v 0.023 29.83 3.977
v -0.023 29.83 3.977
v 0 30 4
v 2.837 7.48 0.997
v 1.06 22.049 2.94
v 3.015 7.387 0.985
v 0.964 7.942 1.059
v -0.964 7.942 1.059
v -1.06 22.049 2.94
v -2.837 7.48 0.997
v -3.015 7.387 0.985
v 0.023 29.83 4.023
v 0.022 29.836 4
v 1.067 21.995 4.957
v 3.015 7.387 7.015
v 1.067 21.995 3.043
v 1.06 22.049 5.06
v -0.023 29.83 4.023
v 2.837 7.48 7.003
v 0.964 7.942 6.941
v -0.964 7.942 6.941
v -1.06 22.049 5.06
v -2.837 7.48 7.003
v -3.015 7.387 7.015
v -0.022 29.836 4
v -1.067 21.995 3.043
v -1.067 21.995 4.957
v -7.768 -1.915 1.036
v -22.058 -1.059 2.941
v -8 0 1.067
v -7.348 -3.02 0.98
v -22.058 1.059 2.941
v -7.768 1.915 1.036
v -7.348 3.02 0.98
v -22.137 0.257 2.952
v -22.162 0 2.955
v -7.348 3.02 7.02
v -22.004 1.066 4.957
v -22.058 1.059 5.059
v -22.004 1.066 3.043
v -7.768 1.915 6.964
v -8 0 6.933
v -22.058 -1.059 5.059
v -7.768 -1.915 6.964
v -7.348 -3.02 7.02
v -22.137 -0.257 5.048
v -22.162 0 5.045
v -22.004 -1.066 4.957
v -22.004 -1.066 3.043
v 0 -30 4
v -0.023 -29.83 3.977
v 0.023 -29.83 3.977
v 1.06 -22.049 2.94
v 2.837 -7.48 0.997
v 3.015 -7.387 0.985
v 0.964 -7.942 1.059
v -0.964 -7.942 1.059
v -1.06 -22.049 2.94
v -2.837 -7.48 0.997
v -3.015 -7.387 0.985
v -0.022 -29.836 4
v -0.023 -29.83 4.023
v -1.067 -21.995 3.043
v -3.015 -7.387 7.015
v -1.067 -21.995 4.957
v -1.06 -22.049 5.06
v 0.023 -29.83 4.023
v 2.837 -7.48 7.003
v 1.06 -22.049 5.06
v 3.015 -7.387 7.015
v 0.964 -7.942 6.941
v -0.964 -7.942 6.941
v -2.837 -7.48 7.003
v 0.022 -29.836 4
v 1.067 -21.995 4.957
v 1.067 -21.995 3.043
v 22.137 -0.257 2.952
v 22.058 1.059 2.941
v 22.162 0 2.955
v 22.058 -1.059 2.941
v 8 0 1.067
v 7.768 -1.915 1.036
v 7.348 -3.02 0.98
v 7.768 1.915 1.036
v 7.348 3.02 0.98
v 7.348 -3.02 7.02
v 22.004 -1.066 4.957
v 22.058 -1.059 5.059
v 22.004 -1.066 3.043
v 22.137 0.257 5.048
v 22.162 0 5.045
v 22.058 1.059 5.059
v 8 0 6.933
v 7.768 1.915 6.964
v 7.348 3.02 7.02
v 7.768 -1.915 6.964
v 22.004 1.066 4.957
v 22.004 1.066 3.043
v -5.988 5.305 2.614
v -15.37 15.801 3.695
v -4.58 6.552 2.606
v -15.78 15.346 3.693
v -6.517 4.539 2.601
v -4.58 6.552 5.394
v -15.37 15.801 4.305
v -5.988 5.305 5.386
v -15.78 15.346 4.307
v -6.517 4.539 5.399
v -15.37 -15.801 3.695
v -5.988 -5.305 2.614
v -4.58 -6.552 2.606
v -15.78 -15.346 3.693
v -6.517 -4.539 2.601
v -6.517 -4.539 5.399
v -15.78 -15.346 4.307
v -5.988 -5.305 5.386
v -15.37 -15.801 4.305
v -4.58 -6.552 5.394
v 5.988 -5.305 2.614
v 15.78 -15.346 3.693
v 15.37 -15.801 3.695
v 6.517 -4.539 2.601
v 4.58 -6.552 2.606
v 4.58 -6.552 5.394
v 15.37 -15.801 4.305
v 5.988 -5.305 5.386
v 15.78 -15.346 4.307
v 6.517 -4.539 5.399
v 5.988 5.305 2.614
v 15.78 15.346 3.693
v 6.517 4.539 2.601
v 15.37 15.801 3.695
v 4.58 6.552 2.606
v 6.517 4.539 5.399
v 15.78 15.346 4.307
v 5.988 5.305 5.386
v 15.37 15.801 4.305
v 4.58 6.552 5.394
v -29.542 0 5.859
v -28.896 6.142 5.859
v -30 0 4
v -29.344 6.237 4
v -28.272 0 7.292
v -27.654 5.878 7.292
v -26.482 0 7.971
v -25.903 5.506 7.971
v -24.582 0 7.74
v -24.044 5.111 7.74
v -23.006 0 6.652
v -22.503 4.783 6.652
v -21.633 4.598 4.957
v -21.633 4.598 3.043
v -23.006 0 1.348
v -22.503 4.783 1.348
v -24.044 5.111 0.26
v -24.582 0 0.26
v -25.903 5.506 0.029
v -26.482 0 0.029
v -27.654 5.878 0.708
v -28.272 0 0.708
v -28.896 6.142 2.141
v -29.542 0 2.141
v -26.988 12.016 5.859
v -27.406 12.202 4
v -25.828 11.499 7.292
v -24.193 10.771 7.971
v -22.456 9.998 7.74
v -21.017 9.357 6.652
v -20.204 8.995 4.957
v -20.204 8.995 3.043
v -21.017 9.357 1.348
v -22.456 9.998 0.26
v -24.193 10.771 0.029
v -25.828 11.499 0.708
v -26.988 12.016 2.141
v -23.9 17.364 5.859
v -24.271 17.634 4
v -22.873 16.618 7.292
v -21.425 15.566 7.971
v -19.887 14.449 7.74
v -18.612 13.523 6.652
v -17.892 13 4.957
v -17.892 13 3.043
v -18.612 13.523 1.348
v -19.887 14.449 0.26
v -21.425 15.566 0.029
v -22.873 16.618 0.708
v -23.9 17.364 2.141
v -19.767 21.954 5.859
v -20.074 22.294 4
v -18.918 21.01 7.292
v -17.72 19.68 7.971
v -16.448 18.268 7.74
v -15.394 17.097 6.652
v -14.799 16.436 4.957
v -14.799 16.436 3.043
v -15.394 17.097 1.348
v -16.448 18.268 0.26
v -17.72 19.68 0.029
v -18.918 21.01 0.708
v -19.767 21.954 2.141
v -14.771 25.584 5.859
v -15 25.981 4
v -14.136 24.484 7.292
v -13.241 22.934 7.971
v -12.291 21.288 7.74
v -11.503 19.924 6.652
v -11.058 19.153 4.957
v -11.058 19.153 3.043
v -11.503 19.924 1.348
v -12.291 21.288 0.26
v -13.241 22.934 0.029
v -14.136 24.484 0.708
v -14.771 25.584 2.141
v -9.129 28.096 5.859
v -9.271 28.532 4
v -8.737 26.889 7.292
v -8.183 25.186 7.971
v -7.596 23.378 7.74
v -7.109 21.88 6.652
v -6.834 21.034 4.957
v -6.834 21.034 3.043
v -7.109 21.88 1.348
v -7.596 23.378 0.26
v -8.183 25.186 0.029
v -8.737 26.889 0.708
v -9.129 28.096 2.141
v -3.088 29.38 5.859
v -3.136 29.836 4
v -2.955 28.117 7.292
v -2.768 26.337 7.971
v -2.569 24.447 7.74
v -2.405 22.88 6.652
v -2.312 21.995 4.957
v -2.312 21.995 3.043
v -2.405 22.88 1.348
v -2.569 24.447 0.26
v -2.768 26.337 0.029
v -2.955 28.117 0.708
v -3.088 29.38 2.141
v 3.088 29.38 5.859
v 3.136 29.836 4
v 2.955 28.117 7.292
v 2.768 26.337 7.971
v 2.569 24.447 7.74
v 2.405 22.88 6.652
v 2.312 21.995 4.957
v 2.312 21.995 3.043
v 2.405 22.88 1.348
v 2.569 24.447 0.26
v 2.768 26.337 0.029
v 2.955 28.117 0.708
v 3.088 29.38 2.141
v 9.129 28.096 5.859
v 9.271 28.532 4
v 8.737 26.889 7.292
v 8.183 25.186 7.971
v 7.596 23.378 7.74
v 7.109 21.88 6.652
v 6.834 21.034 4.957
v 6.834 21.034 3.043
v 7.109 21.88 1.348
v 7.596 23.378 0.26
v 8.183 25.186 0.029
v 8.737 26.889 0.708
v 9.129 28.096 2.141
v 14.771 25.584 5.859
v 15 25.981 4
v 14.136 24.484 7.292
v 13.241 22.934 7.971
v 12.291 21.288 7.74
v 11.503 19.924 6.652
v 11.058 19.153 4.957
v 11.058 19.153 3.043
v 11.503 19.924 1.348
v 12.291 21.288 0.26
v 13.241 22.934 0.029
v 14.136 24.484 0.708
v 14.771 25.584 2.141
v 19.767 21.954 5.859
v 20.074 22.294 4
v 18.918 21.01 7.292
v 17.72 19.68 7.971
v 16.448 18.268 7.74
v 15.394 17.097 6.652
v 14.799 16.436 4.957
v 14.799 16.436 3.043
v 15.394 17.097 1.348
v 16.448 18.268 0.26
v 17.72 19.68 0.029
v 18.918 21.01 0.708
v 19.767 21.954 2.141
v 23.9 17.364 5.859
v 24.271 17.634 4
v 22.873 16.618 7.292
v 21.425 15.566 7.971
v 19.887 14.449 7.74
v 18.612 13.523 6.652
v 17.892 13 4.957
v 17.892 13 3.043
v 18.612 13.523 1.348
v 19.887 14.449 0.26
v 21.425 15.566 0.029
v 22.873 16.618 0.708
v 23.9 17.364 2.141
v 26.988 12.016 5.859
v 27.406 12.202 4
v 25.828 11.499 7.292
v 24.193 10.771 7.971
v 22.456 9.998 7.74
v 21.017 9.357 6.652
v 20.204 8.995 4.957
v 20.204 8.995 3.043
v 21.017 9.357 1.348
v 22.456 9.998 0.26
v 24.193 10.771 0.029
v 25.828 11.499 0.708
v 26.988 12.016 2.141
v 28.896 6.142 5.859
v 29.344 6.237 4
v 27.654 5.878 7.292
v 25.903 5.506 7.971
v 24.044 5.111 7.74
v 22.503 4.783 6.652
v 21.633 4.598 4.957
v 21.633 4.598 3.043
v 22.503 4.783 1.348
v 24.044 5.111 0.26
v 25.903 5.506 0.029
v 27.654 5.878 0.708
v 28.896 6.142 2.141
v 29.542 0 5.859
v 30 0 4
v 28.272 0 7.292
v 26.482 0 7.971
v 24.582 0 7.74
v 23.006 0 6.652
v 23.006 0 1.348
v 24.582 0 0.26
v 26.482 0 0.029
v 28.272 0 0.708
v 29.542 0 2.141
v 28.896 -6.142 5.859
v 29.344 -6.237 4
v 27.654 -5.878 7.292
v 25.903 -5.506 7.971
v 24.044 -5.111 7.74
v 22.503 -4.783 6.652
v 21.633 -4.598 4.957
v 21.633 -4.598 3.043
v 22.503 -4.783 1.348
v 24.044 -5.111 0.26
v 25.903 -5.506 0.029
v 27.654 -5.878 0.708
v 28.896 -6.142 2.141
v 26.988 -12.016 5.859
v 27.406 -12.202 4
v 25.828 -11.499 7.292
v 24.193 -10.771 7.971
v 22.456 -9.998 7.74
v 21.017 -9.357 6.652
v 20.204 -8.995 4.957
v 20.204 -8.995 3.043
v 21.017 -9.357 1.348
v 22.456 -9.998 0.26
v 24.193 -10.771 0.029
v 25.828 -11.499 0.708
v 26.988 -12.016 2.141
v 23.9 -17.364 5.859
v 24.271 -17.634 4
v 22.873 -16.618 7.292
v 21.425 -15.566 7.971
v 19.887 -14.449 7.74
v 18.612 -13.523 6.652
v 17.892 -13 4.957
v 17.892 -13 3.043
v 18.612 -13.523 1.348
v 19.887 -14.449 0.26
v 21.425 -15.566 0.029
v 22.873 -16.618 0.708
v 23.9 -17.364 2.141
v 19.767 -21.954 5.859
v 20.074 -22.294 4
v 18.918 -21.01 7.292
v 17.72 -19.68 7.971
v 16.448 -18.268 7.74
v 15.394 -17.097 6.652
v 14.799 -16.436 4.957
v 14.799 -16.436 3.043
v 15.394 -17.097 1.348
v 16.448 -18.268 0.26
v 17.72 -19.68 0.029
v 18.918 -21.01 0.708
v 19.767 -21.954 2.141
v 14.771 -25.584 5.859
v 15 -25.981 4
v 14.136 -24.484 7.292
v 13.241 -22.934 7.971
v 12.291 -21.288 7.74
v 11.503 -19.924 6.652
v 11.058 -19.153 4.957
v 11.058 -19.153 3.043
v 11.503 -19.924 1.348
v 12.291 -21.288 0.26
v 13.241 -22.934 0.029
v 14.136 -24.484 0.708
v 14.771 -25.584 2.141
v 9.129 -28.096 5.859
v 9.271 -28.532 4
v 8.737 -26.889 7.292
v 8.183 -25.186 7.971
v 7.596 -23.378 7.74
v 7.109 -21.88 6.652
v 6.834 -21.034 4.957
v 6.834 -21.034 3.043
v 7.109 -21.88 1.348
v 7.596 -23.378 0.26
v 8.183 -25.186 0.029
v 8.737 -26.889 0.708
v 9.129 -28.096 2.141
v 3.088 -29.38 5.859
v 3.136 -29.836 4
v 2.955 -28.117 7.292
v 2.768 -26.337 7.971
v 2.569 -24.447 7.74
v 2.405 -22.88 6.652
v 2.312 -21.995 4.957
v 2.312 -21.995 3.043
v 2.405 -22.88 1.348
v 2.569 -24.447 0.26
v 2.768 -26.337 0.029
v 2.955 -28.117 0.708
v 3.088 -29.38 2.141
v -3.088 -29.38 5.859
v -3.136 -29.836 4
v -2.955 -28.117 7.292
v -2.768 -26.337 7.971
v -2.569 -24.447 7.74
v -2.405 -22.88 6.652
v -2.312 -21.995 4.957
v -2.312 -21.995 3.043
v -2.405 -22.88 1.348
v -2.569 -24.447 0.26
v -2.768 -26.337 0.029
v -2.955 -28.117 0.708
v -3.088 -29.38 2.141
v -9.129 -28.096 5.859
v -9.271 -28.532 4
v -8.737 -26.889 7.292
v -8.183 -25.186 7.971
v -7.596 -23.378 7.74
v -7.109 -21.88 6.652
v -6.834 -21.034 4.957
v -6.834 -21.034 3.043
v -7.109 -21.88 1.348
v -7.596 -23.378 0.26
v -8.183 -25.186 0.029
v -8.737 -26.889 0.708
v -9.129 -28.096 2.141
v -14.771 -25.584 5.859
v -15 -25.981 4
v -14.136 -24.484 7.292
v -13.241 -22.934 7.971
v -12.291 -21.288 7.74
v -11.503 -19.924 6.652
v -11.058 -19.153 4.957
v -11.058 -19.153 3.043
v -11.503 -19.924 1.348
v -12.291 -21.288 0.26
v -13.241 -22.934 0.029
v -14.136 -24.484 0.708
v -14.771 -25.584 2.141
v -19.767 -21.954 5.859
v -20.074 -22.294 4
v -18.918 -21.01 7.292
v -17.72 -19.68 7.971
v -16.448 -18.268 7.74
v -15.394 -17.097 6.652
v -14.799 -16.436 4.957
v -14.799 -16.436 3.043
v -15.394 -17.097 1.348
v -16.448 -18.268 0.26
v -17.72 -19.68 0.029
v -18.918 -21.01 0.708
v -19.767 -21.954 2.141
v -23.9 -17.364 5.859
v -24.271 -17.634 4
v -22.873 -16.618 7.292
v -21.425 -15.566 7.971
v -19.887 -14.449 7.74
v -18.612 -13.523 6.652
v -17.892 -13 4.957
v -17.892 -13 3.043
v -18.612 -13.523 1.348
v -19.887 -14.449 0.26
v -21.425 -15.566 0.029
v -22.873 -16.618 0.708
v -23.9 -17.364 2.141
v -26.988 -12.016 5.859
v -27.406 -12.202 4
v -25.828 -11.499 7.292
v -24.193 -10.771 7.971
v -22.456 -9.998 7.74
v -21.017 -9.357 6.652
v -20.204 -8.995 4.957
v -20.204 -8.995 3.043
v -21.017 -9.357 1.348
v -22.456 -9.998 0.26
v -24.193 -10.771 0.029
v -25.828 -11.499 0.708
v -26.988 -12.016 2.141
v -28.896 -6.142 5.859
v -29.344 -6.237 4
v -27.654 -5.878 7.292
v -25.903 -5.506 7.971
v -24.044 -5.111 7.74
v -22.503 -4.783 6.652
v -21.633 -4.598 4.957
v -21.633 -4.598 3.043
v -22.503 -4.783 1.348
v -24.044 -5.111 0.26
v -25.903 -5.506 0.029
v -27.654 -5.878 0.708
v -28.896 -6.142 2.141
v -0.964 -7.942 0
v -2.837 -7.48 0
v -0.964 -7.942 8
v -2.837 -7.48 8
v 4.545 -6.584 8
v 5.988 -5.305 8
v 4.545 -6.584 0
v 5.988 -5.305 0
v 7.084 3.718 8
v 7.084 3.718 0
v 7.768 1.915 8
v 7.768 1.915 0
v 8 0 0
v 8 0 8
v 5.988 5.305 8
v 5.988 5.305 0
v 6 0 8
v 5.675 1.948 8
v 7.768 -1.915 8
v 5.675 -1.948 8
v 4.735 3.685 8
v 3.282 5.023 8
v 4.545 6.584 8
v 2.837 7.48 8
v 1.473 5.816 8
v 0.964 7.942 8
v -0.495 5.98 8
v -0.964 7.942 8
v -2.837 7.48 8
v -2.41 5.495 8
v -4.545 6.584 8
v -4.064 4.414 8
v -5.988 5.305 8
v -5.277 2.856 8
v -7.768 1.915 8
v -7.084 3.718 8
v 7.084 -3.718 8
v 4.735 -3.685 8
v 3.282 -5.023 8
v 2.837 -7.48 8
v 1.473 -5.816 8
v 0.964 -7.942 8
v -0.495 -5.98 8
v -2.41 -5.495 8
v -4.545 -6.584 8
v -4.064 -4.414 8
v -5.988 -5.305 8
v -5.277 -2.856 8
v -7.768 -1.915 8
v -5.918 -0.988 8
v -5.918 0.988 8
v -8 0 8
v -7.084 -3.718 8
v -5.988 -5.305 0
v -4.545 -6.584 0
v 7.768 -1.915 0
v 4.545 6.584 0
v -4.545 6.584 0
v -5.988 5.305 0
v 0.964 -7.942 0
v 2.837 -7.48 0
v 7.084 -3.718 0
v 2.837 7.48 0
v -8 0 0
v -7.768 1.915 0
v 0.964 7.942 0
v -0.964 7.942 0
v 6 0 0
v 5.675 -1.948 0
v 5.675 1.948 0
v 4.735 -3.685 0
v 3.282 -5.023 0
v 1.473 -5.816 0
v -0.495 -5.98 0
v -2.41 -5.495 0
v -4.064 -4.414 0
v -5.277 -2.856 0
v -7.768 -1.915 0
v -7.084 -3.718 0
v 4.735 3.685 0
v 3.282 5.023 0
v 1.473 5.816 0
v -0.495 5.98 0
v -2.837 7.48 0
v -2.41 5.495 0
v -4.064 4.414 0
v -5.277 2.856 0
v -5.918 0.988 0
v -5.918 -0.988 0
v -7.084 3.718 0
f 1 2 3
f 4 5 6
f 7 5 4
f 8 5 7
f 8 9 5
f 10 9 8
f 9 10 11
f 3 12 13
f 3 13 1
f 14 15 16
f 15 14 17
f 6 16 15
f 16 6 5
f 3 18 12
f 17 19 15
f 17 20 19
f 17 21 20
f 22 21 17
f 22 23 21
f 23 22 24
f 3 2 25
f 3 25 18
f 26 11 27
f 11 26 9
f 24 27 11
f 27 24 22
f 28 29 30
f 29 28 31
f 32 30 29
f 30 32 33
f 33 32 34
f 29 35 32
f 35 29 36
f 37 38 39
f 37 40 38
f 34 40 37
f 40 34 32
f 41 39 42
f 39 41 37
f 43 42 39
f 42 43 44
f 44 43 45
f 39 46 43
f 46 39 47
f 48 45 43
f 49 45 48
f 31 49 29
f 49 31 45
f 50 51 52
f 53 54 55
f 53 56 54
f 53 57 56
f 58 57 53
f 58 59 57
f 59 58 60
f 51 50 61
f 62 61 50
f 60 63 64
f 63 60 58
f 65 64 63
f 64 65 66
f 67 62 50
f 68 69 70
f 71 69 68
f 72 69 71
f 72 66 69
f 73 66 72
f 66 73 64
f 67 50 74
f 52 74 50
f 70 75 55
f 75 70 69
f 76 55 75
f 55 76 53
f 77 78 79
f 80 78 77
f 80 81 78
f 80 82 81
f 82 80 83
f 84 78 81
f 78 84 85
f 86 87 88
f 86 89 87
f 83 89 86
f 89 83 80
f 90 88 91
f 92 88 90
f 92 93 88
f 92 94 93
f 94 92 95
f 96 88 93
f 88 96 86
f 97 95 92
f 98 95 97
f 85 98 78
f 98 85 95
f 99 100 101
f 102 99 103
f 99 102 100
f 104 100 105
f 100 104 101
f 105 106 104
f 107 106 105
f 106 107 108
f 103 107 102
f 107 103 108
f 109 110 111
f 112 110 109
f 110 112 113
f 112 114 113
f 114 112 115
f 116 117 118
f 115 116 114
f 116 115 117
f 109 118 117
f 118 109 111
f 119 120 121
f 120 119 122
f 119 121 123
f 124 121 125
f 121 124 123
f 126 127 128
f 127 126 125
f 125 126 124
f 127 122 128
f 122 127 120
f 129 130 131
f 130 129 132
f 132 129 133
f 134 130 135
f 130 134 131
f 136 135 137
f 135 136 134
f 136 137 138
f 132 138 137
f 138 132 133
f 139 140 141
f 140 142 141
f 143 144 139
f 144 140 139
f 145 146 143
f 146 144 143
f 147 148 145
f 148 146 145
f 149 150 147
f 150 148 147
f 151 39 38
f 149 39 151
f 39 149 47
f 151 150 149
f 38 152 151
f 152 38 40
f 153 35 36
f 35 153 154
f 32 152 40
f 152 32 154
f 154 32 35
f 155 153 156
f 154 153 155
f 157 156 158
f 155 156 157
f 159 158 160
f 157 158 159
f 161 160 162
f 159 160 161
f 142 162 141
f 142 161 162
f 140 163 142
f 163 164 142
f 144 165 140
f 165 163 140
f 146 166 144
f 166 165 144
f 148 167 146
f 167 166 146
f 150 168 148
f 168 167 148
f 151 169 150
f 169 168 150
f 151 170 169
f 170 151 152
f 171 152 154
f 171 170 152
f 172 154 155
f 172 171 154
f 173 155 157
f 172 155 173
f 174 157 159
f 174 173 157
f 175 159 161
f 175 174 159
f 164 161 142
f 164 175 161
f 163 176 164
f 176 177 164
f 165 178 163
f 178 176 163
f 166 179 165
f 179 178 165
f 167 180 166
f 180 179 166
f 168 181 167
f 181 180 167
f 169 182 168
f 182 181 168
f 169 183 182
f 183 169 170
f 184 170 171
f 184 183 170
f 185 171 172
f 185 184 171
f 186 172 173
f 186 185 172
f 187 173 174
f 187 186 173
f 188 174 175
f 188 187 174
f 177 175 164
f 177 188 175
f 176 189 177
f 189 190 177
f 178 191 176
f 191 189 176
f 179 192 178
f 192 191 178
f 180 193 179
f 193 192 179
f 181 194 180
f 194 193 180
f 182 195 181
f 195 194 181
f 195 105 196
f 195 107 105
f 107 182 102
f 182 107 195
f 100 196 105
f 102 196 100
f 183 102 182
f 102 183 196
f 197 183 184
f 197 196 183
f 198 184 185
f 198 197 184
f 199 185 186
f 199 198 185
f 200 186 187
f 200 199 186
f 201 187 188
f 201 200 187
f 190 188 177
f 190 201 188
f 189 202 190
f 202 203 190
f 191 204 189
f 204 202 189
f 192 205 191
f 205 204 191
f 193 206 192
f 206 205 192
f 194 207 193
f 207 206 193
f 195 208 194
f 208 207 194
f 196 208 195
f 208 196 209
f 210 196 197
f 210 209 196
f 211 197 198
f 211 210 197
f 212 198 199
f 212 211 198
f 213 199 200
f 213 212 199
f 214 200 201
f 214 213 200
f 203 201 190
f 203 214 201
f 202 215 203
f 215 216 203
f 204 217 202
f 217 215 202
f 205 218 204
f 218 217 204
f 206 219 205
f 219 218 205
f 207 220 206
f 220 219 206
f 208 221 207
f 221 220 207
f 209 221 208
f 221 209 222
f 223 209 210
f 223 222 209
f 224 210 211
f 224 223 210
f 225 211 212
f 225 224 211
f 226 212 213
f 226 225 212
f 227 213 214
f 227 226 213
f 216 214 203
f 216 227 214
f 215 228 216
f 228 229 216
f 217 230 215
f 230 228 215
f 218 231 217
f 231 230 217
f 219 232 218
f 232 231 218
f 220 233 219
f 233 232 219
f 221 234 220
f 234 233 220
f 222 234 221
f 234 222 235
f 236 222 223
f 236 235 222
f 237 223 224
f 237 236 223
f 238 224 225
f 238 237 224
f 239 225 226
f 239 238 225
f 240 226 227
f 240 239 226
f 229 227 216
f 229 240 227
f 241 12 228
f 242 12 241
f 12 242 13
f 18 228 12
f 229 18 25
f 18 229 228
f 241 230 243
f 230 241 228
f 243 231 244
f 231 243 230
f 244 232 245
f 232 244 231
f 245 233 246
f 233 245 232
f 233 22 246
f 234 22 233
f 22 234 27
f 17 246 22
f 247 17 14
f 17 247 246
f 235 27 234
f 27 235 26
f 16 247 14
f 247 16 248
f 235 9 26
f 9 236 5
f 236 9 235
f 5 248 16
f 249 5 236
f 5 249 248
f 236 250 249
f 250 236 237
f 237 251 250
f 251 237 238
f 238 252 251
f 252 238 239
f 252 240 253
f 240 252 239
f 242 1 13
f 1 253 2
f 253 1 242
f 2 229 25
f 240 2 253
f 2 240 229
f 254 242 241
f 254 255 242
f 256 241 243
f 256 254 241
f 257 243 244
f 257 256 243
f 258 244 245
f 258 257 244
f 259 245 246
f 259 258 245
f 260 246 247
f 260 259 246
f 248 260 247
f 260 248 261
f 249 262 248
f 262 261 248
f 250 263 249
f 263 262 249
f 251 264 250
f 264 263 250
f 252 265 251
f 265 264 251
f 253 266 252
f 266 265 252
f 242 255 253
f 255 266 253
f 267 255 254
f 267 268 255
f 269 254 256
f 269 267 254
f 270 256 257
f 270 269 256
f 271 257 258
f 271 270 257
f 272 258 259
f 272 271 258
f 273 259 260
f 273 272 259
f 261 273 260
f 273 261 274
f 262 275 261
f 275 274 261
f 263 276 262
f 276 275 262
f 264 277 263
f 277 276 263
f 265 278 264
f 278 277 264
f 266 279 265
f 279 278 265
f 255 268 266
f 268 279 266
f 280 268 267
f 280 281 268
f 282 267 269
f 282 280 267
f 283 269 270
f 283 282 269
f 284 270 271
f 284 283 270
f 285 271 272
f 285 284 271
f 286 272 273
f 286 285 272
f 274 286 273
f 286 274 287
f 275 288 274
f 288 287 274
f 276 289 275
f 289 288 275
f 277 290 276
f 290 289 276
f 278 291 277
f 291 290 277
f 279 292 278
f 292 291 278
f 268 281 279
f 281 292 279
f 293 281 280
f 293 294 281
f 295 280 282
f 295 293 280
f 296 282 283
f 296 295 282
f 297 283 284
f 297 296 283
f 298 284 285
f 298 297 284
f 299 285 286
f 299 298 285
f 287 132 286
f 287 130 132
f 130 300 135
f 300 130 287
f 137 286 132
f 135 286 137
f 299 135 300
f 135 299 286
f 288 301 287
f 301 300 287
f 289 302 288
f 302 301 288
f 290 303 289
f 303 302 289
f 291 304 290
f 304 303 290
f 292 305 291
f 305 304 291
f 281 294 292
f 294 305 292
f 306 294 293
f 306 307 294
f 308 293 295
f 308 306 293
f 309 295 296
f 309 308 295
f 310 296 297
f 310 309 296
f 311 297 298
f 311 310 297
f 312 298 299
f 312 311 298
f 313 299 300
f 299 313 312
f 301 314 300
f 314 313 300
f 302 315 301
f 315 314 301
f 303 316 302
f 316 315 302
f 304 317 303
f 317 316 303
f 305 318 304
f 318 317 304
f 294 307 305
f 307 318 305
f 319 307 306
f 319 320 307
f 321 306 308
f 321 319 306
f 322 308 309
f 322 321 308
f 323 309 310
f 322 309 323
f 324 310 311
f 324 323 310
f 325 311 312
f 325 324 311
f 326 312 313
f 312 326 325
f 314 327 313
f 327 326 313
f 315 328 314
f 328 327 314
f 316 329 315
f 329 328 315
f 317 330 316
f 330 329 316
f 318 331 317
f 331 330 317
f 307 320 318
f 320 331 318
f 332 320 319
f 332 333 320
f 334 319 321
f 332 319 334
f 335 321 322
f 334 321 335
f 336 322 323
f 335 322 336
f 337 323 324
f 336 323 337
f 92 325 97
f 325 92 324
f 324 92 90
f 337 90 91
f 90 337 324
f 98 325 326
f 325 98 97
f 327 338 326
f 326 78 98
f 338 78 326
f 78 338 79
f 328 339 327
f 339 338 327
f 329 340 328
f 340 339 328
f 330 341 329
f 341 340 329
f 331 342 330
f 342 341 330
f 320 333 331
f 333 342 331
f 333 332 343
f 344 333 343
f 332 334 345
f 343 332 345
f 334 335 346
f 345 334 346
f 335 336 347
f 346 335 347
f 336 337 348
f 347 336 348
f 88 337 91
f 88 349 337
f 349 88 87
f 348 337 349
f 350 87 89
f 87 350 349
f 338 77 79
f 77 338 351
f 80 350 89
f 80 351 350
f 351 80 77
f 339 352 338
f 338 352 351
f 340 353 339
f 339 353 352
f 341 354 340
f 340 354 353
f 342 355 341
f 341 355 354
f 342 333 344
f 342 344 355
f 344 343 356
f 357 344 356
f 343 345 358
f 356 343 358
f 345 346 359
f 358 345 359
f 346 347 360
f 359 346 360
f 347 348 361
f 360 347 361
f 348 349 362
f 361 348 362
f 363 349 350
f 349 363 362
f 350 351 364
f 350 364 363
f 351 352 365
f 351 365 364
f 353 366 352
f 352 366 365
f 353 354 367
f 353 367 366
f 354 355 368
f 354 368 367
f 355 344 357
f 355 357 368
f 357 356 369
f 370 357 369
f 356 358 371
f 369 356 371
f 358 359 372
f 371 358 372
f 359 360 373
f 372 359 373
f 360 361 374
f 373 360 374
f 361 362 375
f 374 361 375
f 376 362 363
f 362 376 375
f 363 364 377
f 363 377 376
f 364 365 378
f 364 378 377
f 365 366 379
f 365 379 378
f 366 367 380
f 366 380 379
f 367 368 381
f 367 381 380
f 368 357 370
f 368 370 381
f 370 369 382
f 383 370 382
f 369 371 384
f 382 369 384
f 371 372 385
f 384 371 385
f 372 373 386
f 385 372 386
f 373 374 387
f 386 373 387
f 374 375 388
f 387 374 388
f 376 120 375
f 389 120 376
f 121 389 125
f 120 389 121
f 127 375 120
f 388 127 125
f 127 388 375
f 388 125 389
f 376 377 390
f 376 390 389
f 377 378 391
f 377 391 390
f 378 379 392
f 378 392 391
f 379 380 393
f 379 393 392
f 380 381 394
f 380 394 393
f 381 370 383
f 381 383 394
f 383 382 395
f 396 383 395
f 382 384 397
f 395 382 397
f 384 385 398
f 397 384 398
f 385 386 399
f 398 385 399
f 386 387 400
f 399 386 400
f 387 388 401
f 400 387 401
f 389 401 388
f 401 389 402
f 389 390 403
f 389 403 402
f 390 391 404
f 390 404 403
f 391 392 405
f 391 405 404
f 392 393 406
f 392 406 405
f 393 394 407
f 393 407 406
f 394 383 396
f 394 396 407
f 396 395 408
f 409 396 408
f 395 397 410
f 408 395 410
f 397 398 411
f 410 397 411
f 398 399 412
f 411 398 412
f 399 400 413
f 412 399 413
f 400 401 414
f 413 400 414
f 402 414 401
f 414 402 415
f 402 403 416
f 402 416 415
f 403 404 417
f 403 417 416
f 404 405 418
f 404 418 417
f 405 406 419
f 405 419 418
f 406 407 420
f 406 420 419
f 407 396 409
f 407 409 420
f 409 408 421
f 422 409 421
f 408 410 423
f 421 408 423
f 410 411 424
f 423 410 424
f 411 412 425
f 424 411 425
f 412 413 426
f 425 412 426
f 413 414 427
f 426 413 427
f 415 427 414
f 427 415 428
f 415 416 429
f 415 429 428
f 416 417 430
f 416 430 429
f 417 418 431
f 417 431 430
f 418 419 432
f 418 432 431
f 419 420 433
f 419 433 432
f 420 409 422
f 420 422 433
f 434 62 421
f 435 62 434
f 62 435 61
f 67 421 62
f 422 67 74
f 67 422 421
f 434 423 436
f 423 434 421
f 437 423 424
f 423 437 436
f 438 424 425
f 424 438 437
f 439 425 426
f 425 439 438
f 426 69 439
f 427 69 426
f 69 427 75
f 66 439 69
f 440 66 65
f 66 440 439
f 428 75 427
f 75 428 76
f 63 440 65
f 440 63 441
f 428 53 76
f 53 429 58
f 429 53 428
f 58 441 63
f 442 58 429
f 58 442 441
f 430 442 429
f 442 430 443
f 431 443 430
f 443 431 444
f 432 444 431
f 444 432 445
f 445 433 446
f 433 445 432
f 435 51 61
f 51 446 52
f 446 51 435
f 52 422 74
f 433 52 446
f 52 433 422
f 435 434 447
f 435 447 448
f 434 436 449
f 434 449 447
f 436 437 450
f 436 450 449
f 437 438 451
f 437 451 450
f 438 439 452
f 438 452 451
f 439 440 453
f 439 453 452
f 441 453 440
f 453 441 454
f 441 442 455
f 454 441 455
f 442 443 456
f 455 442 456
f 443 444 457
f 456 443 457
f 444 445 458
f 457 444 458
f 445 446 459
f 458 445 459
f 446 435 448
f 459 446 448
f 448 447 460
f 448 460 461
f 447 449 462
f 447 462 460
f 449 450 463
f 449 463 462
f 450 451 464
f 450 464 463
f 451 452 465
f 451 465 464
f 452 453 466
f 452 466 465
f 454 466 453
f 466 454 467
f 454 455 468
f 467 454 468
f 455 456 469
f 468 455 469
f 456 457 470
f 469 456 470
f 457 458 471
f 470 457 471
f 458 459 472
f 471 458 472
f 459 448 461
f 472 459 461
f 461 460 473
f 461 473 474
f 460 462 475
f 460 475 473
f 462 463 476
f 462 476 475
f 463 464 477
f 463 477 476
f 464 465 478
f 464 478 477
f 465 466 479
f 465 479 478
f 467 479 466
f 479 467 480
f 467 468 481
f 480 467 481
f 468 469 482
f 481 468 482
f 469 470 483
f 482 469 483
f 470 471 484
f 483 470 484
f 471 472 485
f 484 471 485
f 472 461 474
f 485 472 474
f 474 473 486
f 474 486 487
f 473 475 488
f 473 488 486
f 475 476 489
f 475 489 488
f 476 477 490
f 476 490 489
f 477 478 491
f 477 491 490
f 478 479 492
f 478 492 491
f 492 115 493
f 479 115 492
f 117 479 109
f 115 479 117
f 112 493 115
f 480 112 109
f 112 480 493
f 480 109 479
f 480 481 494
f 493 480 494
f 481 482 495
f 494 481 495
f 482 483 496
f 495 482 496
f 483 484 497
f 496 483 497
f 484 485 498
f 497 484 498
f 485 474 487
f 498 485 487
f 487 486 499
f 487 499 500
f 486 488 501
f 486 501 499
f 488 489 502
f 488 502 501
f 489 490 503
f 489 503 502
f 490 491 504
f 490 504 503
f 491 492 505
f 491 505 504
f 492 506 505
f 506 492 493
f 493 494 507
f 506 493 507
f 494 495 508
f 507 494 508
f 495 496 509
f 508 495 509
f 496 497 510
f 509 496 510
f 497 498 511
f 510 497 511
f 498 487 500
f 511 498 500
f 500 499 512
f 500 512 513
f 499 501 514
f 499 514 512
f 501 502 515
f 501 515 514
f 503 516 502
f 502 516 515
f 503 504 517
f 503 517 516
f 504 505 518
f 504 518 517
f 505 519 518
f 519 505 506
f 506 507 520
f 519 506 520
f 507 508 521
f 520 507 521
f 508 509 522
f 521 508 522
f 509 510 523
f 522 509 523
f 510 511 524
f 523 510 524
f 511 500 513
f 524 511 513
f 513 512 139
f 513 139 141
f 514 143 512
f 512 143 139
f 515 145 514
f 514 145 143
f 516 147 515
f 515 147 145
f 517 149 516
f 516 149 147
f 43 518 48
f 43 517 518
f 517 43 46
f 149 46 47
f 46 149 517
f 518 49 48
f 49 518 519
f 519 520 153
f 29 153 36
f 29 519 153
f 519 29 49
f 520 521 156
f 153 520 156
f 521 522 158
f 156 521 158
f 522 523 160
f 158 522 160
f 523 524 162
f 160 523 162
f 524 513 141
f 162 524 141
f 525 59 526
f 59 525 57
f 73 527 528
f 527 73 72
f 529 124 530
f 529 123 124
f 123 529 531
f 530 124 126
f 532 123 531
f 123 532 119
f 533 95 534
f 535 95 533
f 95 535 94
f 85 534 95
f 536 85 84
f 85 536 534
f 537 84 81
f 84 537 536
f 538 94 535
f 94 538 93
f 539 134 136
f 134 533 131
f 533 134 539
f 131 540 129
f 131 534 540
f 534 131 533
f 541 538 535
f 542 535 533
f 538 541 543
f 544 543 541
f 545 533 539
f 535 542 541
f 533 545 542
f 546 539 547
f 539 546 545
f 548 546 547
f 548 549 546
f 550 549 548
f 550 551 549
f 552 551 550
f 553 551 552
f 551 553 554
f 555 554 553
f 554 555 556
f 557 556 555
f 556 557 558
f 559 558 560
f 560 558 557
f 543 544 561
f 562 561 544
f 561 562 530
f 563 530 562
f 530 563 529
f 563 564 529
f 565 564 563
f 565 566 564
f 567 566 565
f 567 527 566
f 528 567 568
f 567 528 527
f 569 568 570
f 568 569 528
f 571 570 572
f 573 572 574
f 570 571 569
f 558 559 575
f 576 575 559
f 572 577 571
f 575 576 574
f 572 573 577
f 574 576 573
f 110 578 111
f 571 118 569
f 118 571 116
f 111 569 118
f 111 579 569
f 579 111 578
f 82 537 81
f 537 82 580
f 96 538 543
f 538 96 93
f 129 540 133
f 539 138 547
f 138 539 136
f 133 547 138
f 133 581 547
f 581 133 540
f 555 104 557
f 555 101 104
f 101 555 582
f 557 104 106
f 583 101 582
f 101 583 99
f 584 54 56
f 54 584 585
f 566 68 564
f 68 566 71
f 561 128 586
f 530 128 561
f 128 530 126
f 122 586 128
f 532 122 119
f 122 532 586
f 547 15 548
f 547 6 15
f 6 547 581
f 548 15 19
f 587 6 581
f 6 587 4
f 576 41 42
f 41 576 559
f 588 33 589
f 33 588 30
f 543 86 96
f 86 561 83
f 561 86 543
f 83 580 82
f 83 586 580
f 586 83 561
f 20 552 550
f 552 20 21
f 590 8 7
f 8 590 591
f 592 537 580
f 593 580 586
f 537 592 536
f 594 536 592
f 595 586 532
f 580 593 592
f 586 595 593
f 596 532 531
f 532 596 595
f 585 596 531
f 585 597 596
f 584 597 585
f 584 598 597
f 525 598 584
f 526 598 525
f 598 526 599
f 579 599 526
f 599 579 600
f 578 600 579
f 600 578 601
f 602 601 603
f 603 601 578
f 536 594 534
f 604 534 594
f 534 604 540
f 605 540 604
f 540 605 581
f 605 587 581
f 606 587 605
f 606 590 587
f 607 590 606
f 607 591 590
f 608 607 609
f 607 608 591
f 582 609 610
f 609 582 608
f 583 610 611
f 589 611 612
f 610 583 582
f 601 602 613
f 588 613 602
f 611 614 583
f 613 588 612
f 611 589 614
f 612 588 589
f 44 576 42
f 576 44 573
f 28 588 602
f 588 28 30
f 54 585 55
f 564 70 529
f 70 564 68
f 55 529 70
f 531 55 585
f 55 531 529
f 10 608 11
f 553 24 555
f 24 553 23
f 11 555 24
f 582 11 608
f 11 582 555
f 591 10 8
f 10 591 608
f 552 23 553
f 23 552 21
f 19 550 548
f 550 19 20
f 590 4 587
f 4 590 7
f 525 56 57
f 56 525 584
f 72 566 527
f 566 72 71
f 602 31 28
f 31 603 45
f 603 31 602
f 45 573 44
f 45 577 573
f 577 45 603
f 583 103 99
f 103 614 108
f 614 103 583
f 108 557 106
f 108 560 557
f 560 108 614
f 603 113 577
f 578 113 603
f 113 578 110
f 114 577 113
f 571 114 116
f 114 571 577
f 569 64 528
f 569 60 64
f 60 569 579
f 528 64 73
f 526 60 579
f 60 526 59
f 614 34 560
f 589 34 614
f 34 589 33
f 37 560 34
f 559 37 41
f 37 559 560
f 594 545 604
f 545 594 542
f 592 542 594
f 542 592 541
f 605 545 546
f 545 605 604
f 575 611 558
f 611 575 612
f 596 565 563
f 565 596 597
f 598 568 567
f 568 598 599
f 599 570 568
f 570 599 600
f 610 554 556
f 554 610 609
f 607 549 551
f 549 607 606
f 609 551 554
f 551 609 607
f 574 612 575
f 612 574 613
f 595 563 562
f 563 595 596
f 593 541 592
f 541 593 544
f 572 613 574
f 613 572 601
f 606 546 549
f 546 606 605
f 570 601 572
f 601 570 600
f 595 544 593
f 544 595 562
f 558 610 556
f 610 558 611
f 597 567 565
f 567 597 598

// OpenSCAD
debug=false;

spinner_height=8;
spinner_half_height=spinner_height/2;
spinner_quarter_height=spinner_height/4;
spinner_diameter=60;
spinner_radius=spinner_diameter/2;

housing_radius=8;
bearing_outer_radius=6;
bearing_inner_radius=4;
// housing_radius=10;
// bearing_outer_radius=8;
// bearing_inner_radius=6;

// function f(x) = (housing_radius + bearing_outer_radius) / 2;
// function g() = (housing_radius + bearing_outer_radius) / 2;
// hey=f(0);
// echo("hey", hey);
// hey2=g();
// echo("hey2", hey2);

// function spokeStart() = (housing_radius + bearing_outer_radius) / 2;
// function spokeStart() = bearing_outer_radius*(1+1/3);
function spokeStart() = 0;

if (debug) {
  echo("spokeStart()", spokeStart());
}

module bearing() {
  color("blue") {
    difference() {
      cylinder(h=spinner_height, r1=bearing_outer_radius, r2=bearing_outer_radius);
      translate([0,0,-1]) cylinder(h=spinner_height+2, r1=bearing_inner_radius, r2=bearing_inner_radius);
    }
    difference() {
      cylinder(h=spinner_height, r1=bearing_outer_radius-3, r2=bearing_outer_radius-3);
      translate([0,0,-1]) cylinder(h=spinner_height+2, r1=bearing_inner_radius-3, r2=bearing_inner_radius-3);
    }
  }
}

module bearingNegative() {
  color("green") {
    translate([0,0,-spinner_height]) cylinder(h=3*spinner_height, r1=bearing_outer_radius, r2=bearing_outer_radius);
  }
}

module rim() {
    rotate_extrude() {
        translate([spinner_radius-spinner_half_height,spinner_half_height,0]) circle(r=spinner_half_height);
    }
}

module housing() {
    cylinder(h=spinner_height, r1=housing_radius, r2=housing_radius);
}

FatSpokePoints = [
  [spinner_half_height, spokeStart(), 0], // 0 bottom-right
  [-spinner_half_height, spokeStart(), 0], // 1 bottom-left
  [0, spinner_radius, spinner_half_height], // 2 apex
  [spinner_half_height, spokeStart(), spinner_height], // 3 top-right
  [-spinner_half_height, spokeStart(), spinner_height] // 4 top-left
];
FatSpokeFaces = [
  [0,2,1],  // bottom
  [3,2,0],  // right
  [1,2,4],  // left
  [4,2,3],  // top
  [3,0,1,4] // back
];
// translate([-7.5,0,0]) {
//   polyhedron(FatSpokePoints, FatSpokeFaces);
//   color("yellow") {
//     for (idx = [ 0 : len(FatSpokePoints) - 1 ] ) {
//       echo("FatSpokePoints", idx, FatSpokePoints[idx]);
//       translate(FatSpokePoints[idx]) rotate([90,0,0]) linear_extrude(height=0.2) text(text=str(idx), size=2);
//     }
//   }
// }
module fatSpokes() {
  spokes=4;
  starting=0;
  for (angle = [starting : 360 / spokes : 360]) {
    rotate([0,0,angle]) translate([0,0,0]) polyhedron(points=FatSpokePoints, faces=FatSpokeFaces);
  }
}

ThinSpokePoints = [
  [spinner_quarter_height, spokeStart(), spinner_quarter_height], // 0 bottom-right
  [-spinner_quarter_height, spokeStart(), spinner_quarter_height], // 1 bottom-left
  [0, spinner_radius-spinner_half_height, spinner_half_height], // 2 apex
  [spinner_quarter_height, spokeStart(), spinner_height-spinner_quarter_height], // 3 top-right
  [-spinner_quarter_height, spokeStart(), spinner_height-spinner_quarter_height] // 4 top-left
];
ThinSpokeFaces = [
  [0,2,1],  // bottom
  [3,2,0],  // right
  [1,2,4],  // left
  [4,2,3],  // top
  [3,0,1,4] // back
];
// translate([7.5,0,0]) {
//   polyhedron(ThinSpokePoints, ThinSpokeFaces);
//   color("yellow") {
//     for (idx = [ 0 : len(ThinSpokePoints) - 1 ] ) {
//       echo("ThinSpokePoints", idx, ThinSpokePoints[idx]);
//       translate(ThinSpokePoints[idx]) rotate([90,0,0]) linear_extrude(height=0.2) text(text=str(idx), size=2);
//     }
//   }
// }
module thinSpokes() {
  spokes=4;
  starting=45;
  // This is cool, too.
  // spokes=8;
  // starting=360/16;
  for (angle = [starting : 360 / spokes : 360]) {
    rotate([0,0,angle]) translate([0,0,0]) polyhedron(points=ThinSpokePoints, faces=ThinSpokeFaces);
  }
}

module spinner_positives() {
  union() {
    rim();
    housing();
    fatSpokes();
    thinSpokes();
  }
}

module spinner_negatives() {
  // ridges();
  bearingNegative();
}

module spinner() {
  difference() {
    spinner_positives();
    spinner_negatives();
  }
}
spinner();

// bearing();
// bearingNegative();
